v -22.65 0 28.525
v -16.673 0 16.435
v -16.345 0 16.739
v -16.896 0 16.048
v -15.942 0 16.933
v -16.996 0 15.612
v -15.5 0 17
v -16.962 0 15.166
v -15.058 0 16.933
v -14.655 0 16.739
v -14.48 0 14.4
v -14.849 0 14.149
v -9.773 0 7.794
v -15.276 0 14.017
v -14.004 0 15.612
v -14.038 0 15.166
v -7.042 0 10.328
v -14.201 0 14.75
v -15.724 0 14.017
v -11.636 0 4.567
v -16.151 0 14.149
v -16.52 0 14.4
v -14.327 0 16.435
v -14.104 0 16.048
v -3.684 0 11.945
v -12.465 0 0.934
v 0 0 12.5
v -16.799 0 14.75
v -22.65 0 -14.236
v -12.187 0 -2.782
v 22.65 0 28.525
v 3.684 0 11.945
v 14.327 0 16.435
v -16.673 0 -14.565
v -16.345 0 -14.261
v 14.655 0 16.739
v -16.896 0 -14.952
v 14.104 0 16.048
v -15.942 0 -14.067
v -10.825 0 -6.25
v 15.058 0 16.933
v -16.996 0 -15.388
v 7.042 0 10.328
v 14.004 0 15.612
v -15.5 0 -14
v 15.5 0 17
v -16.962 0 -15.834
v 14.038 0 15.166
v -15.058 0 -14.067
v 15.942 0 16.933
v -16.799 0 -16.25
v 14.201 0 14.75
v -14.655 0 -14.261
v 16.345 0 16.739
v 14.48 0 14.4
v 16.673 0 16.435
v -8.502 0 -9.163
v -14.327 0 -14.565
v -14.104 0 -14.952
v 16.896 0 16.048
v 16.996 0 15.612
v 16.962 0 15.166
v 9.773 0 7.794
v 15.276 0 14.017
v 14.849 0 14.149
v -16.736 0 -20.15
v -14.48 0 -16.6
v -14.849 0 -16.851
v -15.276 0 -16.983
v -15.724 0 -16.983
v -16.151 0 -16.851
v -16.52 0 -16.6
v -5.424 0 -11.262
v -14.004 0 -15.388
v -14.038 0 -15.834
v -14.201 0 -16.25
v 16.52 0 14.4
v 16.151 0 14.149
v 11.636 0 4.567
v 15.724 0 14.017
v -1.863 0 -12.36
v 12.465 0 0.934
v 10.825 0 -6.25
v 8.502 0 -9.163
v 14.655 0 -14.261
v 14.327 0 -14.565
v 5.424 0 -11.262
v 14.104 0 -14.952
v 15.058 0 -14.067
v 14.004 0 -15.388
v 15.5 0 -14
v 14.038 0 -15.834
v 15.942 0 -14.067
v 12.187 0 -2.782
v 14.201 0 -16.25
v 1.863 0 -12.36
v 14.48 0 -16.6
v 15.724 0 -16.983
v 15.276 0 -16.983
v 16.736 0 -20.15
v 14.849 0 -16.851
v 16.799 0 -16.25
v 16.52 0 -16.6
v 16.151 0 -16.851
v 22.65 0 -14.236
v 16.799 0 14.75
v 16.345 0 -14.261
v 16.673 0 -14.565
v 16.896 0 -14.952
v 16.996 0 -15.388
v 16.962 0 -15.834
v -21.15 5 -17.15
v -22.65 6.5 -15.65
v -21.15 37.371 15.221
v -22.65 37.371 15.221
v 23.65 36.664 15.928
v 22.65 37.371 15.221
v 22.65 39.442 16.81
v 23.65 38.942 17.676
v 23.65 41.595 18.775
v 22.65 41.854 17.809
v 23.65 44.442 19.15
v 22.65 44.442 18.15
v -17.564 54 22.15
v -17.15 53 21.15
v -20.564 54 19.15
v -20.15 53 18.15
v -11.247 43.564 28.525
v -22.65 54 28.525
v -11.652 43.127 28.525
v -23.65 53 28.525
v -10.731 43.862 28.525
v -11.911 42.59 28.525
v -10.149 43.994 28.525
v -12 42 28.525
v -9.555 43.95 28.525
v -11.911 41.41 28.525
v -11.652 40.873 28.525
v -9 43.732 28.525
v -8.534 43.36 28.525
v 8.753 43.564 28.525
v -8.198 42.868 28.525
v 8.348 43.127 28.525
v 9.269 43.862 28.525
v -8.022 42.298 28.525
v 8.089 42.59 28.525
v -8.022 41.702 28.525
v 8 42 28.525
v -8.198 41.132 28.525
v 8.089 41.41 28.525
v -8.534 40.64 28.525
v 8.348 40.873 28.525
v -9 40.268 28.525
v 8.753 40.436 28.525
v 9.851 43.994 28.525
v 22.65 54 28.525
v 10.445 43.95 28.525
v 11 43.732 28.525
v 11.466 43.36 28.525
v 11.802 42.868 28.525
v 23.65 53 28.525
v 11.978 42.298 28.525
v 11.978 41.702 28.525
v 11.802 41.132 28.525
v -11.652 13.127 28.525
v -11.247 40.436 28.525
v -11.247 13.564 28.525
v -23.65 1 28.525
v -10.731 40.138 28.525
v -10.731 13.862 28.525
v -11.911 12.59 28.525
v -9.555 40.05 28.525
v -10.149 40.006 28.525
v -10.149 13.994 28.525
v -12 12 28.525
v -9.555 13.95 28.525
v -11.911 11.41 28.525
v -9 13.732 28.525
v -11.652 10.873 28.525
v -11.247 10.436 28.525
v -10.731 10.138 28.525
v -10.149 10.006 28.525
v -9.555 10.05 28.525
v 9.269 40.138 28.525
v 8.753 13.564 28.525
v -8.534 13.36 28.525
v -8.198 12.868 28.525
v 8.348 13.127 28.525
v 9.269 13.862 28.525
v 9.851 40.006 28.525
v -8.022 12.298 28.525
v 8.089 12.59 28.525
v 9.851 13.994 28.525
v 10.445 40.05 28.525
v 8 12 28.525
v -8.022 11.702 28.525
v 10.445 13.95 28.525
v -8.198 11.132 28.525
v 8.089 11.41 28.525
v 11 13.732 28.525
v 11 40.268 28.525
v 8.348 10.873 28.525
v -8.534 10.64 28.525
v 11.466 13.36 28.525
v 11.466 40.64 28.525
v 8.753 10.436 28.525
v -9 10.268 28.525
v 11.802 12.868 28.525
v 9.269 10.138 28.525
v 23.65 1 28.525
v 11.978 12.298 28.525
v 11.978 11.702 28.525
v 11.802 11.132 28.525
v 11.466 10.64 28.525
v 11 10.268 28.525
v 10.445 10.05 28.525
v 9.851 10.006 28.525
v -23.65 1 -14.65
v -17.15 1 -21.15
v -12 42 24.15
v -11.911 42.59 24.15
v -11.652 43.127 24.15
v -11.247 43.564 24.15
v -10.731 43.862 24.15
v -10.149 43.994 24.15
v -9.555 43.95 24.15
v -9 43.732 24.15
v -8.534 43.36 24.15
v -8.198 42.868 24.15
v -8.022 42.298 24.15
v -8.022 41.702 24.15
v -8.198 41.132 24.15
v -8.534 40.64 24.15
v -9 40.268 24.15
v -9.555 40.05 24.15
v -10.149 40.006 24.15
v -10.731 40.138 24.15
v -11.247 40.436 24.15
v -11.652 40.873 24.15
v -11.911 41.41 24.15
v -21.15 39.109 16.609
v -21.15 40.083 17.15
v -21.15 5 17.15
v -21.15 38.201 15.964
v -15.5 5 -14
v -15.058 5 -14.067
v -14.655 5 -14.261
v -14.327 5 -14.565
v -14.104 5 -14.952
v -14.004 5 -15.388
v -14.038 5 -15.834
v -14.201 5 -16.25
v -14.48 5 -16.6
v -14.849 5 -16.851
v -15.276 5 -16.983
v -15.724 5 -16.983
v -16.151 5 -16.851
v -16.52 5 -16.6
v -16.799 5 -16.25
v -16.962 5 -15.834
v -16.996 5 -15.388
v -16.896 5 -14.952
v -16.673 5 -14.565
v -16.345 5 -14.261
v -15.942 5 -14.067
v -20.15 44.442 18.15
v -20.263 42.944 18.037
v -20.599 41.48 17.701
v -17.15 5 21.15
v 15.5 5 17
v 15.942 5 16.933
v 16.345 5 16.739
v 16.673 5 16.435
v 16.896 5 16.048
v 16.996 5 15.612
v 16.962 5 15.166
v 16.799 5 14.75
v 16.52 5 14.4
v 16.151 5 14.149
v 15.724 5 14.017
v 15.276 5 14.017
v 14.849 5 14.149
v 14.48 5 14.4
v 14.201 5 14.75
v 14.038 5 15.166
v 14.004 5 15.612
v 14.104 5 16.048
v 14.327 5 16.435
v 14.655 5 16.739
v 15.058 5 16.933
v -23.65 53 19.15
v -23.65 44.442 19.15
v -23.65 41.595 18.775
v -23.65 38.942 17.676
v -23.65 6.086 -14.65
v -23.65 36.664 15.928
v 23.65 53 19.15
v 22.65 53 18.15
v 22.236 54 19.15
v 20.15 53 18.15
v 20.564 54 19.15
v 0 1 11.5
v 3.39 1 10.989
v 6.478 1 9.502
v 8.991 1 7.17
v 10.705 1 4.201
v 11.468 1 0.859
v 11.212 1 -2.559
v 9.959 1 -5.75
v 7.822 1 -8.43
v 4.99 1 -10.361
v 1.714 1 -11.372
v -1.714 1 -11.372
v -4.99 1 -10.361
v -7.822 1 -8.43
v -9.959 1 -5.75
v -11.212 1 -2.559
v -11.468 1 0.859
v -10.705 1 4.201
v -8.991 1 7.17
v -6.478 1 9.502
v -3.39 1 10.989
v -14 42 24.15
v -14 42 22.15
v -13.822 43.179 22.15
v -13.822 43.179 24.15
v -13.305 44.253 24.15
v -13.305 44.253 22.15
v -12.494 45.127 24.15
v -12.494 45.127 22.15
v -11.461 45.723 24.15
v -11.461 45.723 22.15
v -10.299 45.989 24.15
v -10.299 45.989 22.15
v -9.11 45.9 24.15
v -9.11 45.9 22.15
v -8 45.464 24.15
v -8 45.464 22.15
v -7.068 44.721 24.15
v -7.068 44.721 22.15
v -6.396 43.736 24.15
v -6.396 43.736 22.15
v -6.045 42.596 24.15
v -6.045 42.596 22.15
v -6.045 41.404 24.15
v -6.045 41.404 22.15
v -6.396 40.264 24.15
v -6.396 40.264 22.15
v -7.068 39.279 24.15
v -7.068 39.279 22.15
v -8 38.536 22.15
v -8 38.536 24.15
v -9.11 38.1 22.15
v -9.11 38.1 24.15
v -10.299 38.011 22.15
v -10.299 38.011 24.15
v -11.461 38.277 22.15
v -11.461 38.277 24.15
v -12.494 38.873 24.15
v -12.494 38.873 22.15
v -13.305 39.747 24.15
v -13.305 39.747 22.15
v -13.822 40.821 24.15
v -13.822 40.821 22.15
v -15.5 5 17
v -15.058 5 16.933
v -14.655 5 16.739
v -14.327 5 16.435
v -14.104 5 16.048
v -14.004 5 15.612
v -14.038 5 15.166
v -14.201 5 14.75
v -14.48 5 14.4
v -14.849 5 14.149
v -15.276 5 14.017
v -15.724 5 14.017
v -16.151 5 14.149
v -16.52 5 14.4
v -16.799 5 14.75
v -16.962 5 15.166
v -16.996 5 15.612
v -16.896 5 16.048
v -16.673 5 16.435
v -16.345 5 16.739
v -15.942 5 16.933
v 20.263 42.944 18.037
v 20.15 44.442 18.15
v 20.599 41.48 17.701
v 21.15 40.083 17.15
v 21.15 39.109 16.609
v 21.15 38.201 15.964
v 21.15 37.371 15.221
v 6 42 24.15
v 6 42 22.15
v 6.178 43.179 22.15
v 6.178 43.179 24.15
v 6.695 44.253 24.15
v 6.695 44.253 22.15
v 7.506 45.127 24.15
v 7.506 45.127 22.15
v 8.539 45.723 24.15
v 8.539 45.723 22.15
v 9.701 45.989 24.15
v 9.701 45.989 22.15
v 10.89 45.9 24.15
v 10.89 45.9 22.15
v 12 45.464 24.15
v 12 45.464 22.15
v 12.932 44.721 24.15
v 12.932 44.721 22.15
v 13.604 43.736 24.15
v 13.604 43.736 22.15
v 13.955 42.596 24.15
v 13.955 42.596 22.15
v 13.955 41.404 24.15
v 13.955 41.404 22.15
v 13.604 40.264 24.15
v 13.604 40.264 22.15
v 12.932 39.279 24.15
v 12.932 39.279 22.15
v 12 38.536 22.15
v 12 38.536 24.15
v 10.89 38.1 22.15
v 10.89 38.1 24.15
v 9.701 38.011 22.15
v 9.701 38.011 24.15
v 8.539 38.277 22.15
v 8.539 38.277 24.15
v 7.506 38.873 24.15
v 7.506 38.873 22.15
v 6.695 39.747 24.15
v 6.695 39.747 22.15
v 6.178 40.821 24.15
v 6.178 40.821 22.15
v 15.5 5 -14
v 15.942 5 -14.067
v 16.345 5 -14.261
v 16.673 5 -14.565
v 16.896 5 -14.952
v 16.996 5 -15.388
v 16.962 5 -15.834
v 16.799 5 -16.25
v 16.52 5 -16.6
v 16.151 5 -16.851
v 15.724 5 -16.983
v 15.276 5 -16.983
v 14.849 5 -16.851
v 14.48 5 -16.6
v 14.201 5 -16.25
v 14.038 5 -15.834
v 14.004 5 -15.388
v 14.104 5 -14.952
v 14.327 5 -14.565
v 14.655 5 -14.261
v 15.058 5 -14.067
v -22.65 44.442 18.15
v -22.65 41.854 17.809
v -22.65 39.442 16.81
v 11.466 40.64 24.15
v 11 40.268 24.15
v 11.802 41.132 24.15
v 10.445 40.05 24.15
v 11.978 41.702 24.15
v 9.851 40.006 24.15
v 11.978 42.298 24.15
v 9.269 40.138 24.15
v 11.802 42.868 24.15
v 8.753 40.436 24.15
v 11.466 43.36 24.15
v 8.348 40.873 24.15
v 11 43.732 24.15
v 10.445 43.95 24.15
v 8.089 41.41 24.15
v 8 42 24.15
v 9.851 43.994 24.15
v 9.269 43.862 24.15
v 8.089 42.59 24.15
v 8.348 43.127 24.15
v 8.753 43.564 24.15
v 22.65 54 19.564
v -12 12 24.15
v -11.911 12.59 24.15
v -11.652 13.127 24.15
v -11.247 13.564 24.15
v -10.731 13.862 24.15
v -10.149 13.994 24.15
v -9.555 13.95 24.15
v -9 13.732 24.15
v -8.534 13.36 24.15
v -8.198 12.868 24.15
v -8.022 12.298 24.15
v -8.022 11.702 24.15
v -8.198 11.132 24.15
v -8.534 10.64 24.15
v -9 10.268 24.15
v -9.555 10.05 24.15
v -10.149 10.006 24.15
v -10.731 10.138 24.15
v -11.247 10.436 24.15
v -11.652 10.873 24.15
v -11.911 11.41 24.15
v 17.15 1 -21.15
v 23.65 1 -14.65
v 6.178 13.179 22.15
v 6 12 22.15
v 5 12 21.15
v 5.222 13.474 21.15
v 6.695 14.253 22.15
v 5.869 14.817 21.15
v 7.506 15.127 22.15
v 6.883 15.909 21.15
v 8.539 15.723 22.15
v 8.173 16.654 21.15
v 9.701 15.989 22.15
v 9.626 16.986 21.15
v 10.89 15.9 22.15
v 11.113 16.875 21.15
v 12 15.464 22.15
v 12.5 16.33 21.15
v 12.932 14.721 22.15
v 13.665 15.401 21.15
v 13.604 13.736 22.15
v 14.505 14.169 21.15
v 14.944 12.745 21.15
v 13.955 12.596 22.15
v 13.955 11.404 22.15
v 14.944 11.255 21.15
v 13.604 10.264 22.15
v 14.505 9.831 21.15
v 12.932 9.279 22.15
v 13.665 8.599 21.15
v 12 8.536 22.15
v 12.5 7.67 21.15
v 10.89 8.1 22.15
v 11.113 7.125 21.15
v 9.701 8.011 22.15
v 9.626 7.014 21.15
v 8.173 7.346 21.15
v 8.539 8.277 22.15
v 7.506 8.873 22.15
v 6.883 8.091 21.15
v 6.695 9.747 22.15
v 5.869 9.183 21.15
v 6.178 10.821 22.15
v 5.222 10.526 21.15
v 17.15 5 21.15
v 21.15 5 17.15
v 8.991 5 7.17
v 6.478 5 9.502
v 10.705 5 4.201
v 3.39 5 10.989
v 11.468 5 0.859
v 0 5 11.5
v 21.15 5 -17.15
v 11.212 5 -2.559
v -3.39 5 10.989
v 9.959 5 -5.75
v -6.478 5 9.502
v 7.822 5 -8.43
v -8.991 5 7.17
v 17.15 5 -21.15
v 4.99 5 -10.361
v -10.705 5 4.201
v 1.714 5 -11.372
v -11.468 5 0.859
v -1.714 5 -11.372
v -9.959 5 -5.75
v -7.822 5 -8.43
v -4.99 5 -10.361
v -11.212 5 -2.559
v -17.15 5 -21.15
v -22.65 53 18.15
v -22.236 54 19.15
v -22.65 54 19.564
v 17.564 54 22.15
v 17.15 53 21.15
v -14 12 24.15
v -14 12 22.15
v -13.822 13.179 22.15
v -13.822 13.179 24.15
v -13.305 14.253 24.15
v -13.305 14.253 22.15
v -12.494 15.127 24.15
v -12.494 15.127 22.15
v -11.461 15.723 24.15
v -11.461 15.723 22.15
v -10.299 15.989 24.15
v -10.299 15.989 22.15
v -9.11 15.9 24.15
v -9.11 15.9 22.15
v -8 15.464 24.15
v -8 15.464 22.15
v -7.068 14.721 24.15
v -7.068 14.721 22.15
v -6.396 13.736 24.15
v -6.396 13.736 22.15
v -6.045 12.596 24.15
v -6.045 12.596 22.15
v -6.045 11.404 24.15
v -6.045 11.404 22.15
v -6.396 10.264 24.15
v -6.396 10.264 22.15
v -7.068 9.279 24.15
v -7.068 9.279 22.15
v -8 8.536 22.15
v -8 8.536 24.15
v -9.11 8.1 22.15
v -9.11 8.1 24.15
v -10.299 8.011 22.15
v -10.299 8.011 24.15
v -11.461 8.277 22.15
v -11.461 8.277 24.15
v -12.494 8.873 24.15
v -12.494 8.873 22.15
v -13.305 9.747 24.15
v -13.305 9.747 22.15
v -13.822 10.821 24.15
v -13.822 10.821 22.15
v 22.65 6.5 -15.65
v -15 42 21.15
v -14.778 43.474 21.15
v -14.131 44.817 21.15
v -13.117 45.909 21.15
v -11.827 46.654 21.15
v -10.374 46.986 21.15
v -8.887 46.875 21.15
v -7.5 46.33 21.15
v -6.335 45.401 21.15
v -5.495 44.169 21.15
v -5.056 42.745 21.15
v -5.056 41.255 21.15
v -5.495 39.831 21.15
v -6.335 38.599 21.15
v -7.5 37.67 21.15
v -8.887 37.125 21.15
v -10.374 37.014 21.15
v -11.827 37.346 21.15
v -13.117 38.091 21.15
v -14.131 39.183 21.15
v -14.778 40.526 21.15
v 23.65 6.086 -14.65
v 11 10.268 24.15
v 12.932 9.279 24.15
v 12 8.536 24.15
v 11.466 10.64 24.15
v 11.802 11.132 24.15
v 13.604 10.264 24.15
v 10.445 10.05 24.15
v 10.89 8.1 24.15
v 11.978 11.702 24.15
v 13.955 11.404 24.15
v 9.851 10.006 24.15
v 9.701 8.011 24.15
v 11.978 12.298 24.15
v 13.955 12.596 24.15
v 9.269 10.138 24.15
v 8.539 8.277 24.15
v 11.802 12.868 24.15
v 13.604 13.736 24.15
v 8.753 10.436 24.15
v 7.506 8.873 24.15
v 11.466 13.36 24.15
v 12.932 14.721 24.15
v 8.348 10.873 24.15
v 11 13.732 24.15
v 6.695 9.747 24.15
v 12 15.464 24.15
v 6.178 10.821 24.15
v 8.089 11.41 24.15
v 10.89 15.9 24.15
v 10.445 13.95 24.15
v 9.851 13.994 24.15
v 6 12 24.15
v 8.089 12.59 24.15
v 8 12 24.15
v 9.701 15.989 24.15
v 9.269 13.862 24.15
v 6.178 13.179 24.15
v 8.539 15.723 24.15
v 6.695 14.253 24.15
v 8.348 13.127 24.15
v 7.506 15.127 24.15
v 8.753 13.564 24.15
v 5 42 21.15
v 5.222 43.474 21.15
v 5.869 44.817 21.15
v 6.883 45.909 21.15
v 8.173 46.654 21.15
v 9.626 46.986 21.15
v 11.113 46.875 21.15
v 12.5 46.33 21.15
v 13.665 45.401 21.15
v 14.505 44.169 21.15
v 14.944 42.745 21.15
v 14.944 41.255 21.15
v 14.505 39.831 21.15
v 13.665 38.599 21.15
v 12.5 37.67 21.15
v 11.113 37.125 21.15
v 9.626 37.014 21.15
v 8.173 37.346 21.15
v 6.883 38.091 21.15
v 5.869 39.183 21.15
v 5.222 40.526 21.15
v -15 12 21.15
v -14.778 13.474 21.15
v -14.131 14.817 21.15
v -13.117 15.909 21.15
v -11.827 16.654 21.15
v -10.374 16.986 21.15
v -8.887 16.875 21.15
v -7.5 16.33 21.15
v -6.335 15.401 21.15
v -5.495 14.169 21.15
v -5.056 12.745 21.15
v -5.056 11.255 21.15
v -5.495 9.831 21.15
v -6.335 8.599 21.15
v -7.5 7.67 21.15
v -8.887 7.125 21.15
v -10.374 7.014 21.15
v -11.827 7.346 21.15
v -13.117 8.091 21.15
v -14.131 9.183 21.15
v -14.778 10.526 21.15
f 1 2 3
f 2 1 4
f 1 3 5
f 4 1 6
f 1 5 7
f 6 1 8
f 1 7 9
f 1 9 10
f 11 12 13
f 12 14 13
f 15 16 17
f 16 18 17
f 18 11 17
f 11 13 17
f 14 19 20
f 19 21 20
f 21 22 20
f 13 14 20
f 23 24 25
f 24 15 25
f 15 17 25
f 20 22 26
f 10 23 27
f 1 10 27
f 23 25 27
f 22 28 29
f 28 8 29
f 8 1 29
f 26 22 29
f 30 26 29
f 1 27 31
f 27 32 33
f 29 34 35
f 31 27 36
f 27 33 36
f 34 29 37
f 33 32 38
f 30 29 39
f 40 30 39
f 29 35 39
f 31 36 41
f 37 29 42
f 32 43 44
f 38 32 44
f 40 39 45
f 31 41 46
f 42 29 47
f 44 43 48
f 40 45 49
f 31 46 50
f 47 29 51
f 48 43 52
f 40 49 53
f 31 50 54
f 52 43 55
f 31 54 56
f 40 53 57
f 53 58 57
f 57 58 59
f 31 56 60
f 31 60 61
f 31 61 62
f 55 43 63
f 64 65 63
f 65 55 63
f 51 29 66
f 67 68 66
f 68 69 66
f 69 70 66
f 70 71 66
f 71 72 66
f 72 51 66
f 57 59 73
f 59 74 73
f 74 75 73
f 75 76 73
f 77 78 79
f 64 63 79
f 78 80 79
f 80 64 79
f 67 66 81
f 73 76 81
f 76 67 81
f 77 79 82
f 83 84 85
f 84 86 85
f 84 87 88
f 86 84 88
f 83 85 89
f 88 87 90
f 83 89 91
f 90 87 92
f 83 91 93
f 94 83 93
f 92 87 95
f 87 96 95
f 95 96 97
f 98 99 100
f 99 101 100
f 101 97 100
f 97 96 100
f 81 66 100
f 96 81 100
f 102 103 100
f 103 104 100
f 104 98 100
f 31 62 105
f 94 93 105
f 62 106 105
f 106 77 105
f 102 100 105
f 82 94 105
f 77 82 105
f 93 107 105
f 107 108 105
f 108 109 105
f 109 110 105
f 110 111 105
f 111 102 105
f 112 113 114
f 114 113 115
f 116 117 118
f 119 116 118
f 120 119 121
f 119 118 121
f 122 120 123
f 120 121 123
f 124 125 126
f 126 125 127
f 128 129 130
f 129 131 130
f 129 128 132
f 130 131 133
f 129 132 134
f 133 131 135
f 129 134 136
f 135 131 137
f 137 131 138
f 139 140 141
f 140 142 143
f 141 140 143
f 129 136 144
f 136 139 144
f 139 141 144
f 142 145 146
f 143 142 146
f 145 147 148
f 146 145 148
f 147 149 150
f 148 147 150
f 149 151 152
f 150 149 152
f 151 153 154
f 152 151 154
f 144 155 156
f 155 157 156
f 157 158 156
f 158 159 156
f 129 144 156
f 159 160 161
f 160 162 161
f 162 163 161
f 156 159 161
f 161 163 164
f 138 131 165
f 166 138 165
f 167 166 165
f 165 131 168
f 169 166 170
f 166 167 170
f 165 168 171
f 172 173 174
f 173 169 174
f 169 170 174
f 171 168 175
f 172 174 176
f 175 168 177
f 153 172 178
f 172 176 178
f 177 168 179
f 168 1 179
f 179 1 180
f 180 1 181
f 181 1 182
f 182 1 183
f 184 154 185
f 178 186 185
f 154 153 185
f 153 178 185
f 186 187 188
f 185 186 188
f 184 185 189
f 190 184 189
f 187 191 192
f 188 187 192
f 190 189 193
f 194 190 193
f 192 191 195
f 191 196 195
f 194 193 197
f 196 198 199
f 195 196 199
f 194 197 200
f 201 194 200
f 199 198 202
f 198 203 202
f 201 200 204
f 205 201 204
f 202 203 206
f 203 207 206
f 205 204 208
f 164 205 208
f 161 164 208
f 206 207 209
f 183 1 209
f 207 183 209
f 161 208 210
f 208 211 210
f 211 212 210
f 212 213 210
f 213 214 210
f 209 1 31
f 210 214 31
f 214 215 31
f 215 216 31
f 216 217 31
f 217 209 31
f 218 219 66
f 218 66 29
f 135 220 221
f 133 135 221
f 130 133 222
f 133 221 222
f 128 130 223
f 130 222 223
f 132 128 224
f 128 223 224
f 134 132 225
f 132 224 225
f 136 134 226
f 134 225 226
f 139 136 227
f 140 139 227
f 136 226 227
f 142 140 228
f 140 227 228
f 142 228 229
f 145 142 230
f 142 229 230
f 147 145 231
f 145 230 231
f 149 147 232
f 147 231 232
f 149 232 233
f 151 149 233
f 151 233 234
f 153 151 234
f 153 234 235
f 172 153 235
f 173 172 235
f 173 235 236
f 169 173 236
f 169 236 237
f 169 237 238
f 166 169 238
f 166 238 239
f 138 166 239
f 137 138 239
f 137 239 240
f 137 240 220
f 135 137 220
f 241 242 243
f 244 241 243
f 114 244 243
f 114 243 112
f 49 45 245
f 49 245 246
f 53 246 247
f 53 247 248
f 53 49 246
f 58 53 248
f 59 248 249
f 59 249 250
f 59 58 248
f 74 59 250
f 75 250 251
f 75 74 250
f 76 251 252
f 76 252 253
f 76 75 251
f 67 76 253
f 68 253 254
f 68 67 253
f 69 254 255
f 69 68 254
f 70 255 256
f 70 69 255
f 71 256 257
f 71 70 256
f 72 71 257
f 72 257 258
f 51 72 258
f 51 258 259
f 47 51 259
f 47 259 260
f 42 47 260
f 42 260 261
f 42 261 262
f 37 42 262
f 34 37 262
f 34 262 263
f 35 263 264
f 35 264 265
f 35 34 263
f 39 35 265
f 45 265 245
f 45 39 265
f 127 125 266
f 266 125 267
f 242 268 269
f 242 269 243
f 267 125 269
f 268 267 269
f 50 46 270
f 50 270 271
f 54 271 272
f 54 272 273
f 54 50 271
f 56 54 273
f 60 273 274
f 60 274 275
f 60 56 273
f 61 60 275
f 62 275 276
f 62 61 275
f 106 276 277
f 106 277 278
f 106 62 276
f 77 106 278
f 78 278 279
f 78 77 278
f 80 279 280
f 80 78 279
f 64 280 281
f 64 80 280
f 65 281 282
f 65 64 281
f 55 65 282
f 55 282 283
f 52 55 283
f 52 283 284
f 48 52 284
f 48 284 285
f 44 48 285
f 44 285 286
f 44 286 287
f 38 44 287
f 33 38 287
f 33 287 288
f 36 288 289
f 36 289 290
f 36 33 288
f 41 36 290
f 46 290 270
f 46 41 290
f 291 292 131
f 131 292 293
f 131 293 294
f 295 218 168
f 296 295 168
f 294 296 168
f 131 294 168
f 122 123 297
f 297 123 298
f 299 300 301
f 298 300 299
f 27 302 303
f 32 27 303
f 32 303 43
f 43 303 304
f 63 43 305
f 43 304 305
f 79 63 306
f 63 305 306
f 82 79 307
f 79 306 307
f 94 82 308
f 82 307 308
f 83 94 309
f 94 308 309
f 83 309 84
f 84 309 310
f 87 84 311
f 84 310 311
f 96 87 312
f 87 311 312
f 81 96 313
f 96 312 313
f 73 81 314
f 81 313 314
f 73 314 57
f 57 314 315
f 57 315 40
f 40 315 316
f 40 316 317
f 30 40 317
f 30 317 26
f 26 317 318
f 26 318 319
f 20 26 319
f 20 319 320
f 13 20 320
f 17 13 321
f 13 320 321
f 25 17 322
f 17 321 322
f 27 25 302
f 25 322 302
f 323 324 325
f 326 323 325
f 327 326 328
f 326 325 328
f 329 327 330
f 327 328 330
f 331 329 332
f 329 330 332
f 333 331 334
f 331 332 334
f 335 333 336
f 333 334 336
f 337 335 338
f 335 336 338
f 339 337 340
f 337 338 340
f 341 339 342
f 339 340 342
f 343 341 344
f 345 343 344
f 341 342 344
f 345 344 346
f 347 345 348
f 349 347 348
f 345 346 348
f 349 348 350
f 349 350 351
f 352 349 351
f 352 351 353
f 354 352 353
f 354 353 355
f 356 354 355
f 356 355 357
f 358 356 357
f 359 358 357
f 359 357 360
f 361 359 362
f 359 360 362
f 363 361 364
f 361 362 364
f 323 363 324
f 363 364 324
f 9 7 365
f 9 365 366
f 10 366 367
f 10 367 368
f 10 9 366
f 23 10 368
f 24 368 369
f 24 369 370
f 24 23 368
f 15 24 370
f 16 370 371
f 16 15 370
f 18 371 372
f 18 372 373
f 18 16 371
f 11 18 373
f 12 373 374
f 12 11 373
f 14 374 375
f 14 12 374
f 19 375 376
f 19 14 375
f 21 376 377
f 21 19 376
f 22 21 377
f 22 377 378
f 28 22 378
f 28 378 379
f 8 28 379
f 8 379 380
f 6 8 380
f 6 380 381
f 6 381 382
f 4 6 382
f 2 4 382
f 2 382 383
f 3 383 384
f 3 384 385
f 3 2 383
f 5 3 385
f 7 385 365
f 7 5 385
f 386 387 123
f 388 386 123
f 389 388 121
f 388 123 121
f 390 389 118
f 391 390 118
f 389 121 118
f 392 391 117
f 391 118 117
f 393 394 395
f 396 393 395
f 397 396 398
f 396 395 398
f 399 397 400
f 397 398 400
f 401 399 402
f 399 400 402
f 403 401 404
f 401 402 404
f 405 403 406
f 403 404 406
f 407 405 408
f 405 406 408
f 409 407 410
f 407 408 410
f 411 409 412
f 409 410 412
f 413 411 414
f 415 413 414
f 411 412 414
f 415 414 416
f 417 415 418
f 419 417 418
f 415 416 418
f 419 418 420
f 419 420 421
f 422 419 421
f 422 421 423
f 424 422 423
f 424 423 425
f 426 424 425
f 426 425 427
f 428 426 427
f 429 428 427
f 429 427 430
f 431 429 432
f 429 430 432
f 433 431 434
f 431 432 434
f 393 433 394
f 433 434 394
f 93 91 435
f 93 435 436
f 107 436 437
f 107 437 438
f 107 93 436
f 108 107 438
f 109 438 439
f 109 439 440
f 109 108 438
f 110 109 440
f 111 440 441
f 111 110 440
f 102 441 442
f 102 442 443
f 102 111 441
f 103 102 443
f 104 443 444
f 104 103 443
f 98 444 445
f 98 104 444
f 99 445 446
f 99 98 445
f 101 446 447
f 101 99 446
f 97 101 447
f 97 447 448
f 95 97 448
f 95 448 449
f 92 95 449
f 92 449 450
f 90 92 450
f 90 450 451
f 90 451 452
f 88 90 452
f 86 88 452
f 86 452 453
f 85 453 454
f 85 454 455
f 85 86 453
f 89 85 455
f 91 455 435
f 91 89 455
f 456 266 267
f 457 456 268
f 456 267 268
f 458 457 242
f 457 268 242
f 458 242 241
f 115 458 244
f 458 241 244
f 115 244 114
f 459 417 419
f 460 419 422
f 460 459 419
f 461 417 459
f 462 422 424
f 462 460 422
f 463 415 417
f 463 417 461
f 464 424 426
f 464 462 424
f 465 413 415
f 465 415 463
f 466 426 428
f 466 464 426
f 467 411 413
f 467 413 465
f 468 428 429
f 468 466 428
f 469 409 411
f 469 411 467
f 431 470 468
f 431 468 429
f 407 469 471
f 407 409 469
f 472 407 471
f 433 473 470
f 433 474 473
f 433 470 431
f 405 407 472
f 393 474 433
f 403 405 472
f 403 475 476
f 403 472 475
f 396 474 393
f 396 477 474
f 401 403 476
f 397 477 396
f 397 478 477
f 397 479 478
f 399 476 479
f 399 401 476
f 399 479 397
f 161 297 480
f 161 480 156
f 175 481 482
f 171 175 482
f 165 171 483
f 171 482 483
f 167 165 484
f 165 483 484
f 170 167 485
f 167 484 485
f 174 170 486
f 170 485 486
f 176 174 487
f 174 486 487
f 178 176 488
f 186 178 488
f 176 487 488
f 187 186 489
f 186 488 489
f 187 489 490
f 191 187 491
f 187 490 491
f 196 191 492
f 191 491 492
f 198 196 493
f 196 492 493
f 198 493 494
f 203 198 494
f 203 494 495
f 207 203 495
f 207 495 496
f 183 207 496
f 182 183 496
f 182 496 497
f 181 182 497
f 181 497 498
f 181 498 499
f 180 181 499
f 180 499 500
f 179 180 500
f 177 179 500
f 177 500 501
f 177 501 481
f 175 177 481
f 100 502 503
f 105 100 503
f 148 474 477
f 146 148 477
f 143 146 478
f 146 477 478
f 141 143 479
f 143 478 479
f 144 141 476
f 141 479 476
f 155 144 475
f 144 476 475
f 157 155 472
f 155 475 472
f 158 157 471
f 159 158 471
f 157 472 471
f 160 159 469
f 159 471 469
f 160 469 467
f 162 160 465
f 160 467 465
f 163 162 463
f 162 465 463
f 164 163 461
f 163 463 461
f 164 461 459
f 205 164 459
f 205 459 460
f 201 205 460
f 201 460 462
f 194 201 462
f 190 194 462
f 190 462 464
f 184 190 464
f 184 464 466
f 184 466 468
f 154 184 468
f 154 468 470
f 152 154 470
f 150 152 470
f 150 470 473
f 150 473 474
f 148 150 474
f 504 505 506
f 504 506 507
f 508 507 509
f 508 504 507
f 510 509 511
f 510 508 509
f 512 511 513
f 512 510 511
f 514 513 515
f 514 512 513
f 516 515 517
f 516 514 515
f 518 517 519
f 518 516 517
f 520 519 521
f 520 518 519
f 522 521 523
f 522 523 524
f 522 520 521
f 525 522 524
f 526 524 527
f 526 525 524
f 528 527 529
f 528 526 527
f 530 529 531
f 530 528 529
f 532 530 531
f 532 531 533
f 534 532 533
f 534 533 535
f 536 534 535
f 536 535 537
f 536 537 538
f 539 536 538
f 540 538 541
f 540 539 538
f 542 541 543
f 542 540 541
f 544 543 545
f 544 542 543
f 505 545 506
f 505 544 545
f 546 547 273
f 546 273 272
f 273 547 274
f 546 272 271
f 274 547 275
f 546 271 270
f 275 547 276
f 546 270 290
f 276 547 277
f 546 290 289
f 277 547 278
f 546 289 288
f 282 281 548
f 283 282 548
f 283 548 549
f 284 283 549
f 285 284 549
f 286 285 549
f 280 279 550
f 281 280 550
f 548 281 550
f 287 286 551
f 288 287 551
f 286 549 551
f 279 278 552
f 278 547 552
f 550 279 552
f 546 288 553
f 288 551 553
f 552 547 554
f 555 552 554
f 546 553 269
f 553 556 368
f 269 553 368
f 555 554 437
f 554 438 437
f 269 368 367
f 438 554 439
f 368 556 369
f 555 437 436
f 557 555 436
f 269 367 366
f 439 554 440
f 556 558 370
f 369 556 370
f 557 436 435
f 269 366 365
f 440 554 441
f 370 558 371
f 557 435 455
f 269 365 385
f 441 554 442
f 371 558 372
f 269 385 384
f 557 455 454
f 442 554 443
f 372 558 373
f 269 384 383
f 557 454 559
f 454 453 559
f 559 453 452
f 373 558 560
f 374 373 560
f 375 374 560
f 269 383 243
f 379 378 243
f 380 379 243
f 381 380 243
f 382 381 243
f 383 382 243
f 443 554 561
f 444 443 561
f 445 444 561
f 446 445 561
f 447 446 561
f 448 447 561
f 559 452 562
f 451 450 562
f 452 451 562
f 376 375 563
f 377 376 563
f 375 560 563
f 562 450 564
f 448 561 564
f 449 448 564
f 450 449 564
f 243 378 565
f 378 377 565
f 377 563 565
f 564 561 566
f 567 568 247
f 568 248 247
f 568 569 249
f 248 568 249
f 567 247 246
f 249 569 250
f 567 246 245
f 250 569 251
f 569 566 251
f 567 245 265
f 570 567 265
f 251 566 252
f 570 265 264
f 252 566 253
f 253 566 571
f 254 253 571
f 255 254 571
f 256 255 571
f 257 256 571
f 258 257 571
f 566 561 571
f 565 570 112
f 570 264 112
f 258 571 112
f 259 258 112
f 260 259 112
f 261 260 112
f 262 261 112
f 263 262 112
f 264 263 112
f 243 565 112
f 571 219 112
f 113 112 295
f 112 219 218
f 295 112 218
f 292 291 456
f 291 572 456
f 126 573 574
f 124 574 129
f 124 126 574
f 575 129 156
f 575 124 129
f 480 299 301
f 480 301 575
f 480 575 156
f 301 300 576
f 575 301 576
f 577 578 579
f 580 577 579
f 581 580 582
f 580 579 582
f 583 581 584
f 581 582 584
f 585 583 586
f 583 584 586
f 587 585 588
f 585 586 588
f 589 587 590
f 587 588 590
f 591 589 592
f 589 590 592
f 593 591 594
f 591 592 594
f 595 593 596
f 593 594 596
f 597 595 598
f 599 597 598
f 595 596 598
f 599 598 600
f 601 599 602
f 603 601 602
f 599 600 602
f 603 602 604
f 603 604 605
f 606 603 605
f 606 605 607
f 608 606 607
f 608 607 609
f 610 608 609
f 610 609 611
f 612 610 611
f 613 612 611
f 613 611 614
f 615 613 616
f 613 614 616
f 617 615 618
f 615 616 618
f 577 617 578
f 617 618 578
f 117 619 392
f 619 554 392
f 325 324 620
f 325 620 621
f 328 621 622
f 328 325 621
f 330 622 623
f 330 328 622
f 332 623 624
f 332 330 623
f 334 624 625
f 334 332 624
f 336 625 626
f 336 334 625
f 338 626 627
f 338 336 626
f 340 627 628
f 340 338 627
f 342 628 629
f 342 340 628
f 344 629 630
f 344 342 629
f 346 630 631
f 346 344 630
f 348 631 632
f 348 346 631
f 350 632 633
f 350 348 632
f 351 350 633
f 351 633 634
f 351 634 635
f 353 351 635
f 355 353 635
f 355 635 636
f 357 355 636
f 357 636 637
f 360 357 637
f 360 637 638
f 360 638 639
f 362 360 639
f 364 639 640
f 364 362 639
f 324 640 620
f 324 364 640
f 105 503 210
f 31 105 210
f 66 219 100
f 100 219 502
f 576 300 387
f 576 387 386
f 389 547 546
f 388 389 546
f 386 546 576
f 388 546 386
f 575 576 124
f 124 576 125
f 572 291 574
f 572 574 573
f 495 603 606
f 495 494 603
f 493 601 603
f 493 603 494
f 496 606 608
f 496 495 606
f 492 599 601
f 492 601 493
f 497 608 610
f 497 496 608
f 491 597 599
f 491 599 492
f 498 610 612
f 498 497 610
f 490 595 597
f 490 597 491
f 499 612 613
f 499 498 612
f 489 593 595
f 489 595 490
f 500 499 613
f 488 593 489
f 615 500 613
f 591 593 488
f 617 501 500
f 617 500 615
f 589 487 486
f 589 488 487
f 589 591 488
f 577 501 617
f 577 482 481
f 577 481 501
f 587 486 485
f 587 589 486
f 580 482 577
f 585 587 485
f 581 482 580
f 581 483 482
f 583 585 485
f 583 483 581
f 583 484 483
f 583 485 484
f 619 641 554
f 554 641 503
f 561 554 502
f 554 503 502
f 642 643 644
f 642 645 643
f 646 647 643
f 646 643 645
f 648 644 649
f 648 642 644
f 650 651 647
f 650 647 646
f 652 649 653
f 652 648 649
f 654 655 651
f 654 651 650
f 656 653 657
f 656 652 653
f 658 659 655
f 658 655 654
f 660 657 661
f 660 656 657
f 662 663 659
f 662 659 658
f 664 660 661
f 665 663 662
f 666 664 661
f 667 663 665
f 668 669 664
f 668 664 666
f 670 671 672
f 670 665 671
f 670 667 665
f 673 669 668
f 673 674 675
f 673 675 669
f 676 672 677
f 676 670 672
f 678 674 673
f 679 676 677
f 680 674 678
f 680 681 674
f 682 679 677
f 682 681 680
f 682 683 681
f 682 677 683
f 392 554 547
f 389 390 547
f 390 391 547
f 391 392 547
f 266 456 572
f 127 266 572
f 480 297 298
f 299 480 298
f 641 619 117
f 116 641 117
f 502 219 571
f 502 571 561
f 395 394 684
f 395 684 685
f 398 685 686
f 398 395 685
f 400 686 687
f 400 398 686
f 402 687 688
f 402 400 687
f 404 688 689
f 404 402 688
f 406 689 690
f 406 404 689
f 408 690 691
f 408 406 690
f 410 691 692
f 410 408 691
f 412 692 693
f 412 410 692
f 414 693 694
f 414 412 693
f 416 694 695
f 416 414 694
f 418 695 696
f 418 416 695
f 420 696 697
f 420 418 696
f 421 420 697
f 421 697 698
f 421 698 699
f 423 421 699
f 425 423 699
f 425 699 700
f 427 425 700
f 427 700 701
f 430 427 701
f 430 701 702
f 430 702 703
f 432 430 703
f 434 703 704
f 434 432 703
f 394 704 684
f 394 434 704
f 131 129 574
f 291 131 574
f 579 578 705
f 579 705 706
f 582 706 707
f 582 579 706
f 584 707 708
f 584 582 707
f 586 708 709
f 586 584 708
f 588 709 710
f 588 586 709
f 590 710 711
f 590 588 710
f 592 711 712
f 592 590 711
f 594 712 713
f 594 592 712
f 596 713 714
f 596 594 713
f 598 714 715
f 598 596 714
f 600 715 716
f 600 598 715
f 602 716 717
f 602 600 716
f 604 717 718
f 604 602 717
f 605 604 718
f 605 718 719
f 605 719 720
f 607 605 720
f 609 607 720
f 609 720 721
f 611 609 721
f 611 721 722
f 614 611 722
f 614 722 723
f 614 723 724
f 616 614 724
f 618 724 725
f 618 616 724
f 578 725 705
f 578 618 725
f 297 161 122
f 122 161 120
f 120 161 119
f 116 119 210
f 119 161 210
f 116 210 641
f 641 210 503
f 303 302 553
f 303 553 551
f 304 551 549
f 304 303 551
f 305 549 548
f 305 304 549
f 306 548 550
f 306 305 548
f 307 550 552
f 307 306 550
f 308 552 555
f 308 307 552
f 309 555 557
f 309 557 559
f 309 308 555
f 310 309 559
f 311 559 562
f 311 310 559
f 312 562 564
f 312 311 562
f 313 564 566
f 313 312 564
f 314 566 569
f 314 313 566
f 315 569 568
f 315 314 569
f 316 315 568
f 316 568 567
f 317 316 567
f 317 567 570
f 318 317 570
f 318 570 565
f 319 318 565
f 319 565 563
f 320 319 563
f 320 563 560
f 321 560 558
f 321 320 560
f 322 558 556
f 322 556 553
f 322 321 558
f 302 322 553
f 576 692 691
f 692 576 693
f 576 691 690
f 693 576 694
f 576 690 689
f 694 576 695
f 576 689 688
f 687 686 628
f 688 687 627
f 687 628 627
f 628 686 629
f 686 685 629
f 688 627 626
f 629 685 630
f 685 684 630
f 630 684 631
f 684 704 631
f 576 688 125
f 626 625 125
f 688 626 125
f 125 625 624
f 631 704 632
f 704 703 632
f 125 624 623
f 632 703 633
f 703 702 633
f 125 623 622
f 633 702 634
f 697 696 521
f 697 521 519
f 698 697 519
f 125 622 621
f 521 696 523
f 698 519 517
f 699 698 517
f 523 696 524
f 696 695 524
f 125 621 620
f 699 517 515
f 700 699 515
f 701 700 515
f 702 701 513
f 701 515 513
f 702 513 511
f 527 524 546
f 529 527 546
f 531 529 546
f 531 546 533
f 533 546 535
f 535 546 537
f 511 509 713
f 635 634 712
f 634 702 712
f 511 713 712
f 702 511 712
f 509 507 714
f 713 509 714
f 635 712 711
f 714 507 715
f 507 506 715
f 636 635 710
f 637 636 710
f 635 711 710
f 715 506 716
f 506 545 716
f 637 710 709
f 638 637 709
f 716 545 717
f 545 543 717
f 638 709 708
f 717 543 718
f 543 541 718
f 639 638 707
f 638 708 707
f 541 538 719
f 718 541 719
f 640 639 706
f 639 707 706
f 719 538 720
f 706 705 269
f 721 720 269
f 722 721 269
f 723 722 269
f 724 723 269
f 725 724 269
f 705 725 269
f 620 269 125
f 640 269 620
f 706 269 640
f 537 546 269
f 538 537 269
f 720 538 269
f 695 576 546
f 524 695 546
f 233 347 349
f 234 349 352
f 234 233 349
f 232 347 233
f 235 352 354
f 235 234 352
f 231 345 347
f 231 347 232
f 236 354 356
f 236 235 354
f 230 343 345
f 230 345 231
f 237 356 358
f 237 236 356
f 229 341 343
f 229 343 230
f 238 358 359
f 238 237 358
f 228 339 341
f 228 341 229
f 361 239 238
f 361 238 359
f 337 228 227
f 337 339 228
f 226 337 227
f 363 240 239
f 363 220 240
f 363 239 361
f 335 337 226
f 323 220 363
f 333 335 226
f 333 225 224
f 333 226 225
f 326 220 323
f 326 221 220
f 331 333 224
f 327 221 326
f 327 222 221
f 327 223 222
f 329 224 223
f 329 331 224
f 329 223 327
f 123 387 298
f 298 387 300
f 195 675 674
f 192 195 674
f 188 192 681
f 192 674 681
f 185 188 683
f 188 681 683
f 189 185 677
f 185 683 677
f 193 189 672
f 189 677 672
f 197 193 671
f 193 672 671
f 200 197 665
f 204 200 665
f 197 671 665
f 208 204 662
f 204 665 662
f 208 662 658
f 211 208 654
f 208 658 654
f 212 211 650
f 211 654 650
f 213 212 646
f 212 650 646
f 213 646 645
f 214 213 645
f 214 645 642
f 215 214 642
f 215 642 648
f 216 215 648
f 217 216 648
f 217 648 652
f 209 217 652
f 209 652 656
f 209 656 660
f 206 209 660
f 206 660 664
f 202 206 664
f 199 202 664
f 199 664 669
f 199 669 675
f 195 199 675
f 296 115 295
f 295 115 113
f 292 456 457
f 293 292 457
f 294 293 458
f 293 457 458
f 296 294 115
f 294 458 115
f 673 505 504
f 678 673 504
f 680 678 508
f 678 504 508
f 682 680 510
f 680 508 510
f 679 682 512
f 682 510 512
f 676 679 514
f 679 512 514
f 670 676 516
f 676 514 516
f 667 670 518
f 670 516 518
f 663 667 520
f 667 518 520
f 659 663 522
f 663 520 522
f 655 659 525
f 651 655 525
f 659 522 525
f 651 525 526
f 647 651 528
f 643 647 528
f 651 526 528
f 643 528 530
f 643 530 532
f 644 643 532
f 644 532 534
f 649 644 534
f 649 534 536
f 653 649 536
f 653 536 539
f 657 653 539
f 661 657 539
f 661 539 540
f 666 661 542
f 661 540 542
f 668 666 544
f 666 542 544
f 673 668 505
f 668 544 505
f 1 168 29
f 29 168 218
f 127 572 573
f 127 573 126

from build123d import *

# Parameters (mm, degrees)
SKETCH1_R               = 1.5
SKETCH1_R_2             = 11.5
BOSS_EXTRUDE1_DEPTH     = 5
BOSS_EXTRUDE2_DEPTH     = 54
CUT_EXTRUDE1_DEPTH      = 64.518855468
CUT_EXTRUDE1_DEPTH_BACK = 64.518855468
FILLET1_R               = 10
BOSS_EXTRUDE3_DEPTH     = 51
CHAMFER2_SIZE           = 1
BOSS_EXTRUDE4_DEPTH     = 54
CHAMFER3_SIZE           = 1
CHAMFER4_SIZE           = 1
CHAMFER5_SIZE           = 1
SKETCH11_R              = 4
CUT_EXTRUDE2_DEPTH      = 3
SKETCH12_R              = 2
CUT_EXTRUDE3_DEPTH      = 73.557649493
CHAMFER6_SIZE           = 1


with BuildPart() as part:
    # Sketch1 → Boss-Extrude1 (new body)
    with BuildSketch(Plane(origin=(0, 0, 0), x_dir=(1, 0, 0), z_dir=(0, 1, 0))):
        Polygon((-21.15, 17.15), (-17.15, 21.15), (17.15, 21.15), (21.15, 17.15), (21.15, -17.15), (17.15, -21.15), (-17.15, -21.15), (-21.15, -17.15), align=None)
        with Locations(Location((-15.5, 15.5, 0), (0, 0, 270))):
            Circle(SKETCH1_R, mode=Mode.SUBTRACT)
        with Locations(Location((15.5, 15.5, 0), (0, 0, 270))):
            Circle(SKETCH1_R, mode=Mode.SUBTRACT)
        with Locations(Location((15.5, -15.5, 0), (0, 0, 270))):
            Circle(SKETCH1_R, mode=Mode.SUBTRACT)
        with Locations(Location((-15.5, -15.5, 0), (0, 0, 270))):
            Circle(SKETCH1_R, mode=Mode.SUBTRACT)
        with Locations(Location((0, 0, 0), (0, 0, 270))):
            Circle(SKETCH1_R_2, mode=Mode.SUBTRACT)
    extrude(amount=BOSS_EXTRUDE1_DEPTH)

    # Sketch5 → Boss-Extrude2 (add)
    with BuildSketch(Plane(origin=(0, 0, 0), x_dir=(1, 0, 0), z_dir=(0, 1, 0))):
        Polygon((-23.65, 14.65), (-23.65, -18.185533906), (-18.185533906, -23.65), (18.185533906, -23.65), (23.65, -18.185533906), (23.65, 14.65), (21.15, 17.15), (21.15, -17.15), (17.15, -21.15), (-17.15, -21.15), (-21.15, -17.15), (-21.15, 17.15), align=None)
    extrude(amount=BOSS_EXTRUDE2_DEPTH)

    # Sketch6 → Cut-Extrude1 (cut, two sides: drawn at the far end of the back side and taken through both)
    with BuildSketch(Plane(origin=(0, 0, 0), x_dir=(0, 0, -1), z_dir=(1, 0, 0)).offset(-CUT_EXTRUDE1_DEPTH_BACK)):
        Polygon((17.15, 5), (-18.15, 40.3), (-18.15, 54), (17.15, 54), align=None)
    extrude(amount=CUT_EXTRUDE1_DEPTH + CUT_EXTRUDE1_DEPTH_BACK, mode=Mode.SUBTRACT)

    # Fillet1
    fillet1_edges = [part.edges().sort_by_distance(p)[0] for p in [
        (-21.9, 40.3, 18.15),
        (21.9, 40.3, 18.15),
    ]]
    fillet(fillet1_edges, radius=FILLET1_R)

    # Sketch9 → Boss-Extrude3 (add)
    with BuildSketch(Plane(origin=(0, 0, 0), x_dir=(1, 0, 0), z_dir=(0, 1, 0))):
        Polygon((-18.185533906, -23.65), (-21, -28.524798271), (21, -28.524798271), (18.185533906, -23.65), align=None)
    extrude(amount=BOSS_EXTRUDE3_DEPTH)

    # Chamfer2
    chamfer2_edges = [part.edges().sort_by_distance(p)[0] for p in [
        (0, 0, -11.5),
    ]]
    chamfer(chamfer2_edges, length=CHAMFER2_SIZE)

    # Sketch10 → Boss-Extrude4 (add)
    with BuildSketch(Plane(origin=(0, 54, 0), x_dir=(1, 0, 0), z_dir=(0, 1, 0))):
        Polygon((-23.65, -18.15), (-20.15, -18.15), (-17.15, -21.15), (17.15, -21.15), (20.15, -18.15), (23.65, -18.15), (23.65, -28.524798271), (-23.65, -28.524798271), align=None)
    extrude(amount=-BOSS_EXTRUDE4_DEPTH)

    # Chamfer3
    chamfer3_edges = [part.edges().sort_by_distance(p)[0] for p in [
        (-23.65, 0, 6.937399136),
        (23.65, 0, 6.937399136),
        (-20.4, 0, -17.9),
        (0, 0, -21.15),
        (20.4, 0, -17.9),
    ]]
    chamfer(chamfer3_edges, length=CHAMFER3_SIZE)

    # Chamfer4
    chamfer4_edges = [part.edges().sort_by_distance(p)[0] for p in [
        (-23.65, 22.435533906, 0.285533906),
        (23.65, 22.435533906, 0.285533906),
        (-23.65, 40.6153013, 17.388795325),
        (23.65, 40.6153013, 17.388795325),
        (-23.65, 49.221067812, 18.15),
        (23.65, 49.221067812, 18.15),
    ]]
    chamfer(chamfer4_edges, length=CHAMFER4_SIZE)

    # Chamfer5
    chamfer5_edges = [part.edges().sort_by_distance(p)[0] for p in [
        (-23.65, 54, 23.837399136),
        (-21.4, 54, 18.15),
        (23.15, 54, 18.65),
        (-23.15, 54, 18.65),
        (23.65, 54, 23.837399136),
        (0, 54, 21.15),
        (-18.65, 54, 19.65),
        (18.65, 54, 19.65),
        (21.4, 54, 18.15),
    ]]
    chamfer(chamfer5_edges, length=CHAMFER5_SIZE)

    # Sketch11 → Cut-Extrude2 (cut)
    with BuildSketch(Plane(origin=(0, 0, 21.15), x_dir=(-1, 0, 0), z_dir=(0, 0, -1))):
        with Locations((-10, 42)):
            Circle(SKETCH11_R)
        with Locations((10, 42)):
            Circle(SKETCH11_R)
        with Locations((-10, 12)):
            Circle(SKETCH11_R)
        with Locations((10, 12)):
            Circle(SKETCH11_R)
    extrude(amount=-CUT_EXTRUDE2_DEPTH, mode=Mode.SUBTRACT)

    # Sketch12 → Cut-Extrude3 (cut, through all)
    with BuildSketch(Plane(origin=(0, 0, 21.15), x_dir=(-1, 0, 0), z_dir=(0, 0, -1))):
        with Locations((-10, 42)):
            Circle(SKETCH12_R)
        with Locations((10, 42)):
            Circle(SKETCH12_R)
        with Locations((-10, 12)):
            Circle(SKETCH12_R)
        with Locations((10, 12)):
            Circle(SKETCH12_R)
    extrude(amount=-CUT_EXTRUDE3_DEPTH, mode=Mode.SUBTRACT)

    # Chamfer6
    chamfer6_edges = [part.edges().sort_by_distance(p)[0] for p in [
        (-6, 42, 21.15),
        (14, 12, 21.15),
        (-6, 12, 21.15),
        (14, 42, 21.15),
    ]]
    chamfer(chamfer6_edges, length=CHAMFER6_SIZE)


solid = part.part
